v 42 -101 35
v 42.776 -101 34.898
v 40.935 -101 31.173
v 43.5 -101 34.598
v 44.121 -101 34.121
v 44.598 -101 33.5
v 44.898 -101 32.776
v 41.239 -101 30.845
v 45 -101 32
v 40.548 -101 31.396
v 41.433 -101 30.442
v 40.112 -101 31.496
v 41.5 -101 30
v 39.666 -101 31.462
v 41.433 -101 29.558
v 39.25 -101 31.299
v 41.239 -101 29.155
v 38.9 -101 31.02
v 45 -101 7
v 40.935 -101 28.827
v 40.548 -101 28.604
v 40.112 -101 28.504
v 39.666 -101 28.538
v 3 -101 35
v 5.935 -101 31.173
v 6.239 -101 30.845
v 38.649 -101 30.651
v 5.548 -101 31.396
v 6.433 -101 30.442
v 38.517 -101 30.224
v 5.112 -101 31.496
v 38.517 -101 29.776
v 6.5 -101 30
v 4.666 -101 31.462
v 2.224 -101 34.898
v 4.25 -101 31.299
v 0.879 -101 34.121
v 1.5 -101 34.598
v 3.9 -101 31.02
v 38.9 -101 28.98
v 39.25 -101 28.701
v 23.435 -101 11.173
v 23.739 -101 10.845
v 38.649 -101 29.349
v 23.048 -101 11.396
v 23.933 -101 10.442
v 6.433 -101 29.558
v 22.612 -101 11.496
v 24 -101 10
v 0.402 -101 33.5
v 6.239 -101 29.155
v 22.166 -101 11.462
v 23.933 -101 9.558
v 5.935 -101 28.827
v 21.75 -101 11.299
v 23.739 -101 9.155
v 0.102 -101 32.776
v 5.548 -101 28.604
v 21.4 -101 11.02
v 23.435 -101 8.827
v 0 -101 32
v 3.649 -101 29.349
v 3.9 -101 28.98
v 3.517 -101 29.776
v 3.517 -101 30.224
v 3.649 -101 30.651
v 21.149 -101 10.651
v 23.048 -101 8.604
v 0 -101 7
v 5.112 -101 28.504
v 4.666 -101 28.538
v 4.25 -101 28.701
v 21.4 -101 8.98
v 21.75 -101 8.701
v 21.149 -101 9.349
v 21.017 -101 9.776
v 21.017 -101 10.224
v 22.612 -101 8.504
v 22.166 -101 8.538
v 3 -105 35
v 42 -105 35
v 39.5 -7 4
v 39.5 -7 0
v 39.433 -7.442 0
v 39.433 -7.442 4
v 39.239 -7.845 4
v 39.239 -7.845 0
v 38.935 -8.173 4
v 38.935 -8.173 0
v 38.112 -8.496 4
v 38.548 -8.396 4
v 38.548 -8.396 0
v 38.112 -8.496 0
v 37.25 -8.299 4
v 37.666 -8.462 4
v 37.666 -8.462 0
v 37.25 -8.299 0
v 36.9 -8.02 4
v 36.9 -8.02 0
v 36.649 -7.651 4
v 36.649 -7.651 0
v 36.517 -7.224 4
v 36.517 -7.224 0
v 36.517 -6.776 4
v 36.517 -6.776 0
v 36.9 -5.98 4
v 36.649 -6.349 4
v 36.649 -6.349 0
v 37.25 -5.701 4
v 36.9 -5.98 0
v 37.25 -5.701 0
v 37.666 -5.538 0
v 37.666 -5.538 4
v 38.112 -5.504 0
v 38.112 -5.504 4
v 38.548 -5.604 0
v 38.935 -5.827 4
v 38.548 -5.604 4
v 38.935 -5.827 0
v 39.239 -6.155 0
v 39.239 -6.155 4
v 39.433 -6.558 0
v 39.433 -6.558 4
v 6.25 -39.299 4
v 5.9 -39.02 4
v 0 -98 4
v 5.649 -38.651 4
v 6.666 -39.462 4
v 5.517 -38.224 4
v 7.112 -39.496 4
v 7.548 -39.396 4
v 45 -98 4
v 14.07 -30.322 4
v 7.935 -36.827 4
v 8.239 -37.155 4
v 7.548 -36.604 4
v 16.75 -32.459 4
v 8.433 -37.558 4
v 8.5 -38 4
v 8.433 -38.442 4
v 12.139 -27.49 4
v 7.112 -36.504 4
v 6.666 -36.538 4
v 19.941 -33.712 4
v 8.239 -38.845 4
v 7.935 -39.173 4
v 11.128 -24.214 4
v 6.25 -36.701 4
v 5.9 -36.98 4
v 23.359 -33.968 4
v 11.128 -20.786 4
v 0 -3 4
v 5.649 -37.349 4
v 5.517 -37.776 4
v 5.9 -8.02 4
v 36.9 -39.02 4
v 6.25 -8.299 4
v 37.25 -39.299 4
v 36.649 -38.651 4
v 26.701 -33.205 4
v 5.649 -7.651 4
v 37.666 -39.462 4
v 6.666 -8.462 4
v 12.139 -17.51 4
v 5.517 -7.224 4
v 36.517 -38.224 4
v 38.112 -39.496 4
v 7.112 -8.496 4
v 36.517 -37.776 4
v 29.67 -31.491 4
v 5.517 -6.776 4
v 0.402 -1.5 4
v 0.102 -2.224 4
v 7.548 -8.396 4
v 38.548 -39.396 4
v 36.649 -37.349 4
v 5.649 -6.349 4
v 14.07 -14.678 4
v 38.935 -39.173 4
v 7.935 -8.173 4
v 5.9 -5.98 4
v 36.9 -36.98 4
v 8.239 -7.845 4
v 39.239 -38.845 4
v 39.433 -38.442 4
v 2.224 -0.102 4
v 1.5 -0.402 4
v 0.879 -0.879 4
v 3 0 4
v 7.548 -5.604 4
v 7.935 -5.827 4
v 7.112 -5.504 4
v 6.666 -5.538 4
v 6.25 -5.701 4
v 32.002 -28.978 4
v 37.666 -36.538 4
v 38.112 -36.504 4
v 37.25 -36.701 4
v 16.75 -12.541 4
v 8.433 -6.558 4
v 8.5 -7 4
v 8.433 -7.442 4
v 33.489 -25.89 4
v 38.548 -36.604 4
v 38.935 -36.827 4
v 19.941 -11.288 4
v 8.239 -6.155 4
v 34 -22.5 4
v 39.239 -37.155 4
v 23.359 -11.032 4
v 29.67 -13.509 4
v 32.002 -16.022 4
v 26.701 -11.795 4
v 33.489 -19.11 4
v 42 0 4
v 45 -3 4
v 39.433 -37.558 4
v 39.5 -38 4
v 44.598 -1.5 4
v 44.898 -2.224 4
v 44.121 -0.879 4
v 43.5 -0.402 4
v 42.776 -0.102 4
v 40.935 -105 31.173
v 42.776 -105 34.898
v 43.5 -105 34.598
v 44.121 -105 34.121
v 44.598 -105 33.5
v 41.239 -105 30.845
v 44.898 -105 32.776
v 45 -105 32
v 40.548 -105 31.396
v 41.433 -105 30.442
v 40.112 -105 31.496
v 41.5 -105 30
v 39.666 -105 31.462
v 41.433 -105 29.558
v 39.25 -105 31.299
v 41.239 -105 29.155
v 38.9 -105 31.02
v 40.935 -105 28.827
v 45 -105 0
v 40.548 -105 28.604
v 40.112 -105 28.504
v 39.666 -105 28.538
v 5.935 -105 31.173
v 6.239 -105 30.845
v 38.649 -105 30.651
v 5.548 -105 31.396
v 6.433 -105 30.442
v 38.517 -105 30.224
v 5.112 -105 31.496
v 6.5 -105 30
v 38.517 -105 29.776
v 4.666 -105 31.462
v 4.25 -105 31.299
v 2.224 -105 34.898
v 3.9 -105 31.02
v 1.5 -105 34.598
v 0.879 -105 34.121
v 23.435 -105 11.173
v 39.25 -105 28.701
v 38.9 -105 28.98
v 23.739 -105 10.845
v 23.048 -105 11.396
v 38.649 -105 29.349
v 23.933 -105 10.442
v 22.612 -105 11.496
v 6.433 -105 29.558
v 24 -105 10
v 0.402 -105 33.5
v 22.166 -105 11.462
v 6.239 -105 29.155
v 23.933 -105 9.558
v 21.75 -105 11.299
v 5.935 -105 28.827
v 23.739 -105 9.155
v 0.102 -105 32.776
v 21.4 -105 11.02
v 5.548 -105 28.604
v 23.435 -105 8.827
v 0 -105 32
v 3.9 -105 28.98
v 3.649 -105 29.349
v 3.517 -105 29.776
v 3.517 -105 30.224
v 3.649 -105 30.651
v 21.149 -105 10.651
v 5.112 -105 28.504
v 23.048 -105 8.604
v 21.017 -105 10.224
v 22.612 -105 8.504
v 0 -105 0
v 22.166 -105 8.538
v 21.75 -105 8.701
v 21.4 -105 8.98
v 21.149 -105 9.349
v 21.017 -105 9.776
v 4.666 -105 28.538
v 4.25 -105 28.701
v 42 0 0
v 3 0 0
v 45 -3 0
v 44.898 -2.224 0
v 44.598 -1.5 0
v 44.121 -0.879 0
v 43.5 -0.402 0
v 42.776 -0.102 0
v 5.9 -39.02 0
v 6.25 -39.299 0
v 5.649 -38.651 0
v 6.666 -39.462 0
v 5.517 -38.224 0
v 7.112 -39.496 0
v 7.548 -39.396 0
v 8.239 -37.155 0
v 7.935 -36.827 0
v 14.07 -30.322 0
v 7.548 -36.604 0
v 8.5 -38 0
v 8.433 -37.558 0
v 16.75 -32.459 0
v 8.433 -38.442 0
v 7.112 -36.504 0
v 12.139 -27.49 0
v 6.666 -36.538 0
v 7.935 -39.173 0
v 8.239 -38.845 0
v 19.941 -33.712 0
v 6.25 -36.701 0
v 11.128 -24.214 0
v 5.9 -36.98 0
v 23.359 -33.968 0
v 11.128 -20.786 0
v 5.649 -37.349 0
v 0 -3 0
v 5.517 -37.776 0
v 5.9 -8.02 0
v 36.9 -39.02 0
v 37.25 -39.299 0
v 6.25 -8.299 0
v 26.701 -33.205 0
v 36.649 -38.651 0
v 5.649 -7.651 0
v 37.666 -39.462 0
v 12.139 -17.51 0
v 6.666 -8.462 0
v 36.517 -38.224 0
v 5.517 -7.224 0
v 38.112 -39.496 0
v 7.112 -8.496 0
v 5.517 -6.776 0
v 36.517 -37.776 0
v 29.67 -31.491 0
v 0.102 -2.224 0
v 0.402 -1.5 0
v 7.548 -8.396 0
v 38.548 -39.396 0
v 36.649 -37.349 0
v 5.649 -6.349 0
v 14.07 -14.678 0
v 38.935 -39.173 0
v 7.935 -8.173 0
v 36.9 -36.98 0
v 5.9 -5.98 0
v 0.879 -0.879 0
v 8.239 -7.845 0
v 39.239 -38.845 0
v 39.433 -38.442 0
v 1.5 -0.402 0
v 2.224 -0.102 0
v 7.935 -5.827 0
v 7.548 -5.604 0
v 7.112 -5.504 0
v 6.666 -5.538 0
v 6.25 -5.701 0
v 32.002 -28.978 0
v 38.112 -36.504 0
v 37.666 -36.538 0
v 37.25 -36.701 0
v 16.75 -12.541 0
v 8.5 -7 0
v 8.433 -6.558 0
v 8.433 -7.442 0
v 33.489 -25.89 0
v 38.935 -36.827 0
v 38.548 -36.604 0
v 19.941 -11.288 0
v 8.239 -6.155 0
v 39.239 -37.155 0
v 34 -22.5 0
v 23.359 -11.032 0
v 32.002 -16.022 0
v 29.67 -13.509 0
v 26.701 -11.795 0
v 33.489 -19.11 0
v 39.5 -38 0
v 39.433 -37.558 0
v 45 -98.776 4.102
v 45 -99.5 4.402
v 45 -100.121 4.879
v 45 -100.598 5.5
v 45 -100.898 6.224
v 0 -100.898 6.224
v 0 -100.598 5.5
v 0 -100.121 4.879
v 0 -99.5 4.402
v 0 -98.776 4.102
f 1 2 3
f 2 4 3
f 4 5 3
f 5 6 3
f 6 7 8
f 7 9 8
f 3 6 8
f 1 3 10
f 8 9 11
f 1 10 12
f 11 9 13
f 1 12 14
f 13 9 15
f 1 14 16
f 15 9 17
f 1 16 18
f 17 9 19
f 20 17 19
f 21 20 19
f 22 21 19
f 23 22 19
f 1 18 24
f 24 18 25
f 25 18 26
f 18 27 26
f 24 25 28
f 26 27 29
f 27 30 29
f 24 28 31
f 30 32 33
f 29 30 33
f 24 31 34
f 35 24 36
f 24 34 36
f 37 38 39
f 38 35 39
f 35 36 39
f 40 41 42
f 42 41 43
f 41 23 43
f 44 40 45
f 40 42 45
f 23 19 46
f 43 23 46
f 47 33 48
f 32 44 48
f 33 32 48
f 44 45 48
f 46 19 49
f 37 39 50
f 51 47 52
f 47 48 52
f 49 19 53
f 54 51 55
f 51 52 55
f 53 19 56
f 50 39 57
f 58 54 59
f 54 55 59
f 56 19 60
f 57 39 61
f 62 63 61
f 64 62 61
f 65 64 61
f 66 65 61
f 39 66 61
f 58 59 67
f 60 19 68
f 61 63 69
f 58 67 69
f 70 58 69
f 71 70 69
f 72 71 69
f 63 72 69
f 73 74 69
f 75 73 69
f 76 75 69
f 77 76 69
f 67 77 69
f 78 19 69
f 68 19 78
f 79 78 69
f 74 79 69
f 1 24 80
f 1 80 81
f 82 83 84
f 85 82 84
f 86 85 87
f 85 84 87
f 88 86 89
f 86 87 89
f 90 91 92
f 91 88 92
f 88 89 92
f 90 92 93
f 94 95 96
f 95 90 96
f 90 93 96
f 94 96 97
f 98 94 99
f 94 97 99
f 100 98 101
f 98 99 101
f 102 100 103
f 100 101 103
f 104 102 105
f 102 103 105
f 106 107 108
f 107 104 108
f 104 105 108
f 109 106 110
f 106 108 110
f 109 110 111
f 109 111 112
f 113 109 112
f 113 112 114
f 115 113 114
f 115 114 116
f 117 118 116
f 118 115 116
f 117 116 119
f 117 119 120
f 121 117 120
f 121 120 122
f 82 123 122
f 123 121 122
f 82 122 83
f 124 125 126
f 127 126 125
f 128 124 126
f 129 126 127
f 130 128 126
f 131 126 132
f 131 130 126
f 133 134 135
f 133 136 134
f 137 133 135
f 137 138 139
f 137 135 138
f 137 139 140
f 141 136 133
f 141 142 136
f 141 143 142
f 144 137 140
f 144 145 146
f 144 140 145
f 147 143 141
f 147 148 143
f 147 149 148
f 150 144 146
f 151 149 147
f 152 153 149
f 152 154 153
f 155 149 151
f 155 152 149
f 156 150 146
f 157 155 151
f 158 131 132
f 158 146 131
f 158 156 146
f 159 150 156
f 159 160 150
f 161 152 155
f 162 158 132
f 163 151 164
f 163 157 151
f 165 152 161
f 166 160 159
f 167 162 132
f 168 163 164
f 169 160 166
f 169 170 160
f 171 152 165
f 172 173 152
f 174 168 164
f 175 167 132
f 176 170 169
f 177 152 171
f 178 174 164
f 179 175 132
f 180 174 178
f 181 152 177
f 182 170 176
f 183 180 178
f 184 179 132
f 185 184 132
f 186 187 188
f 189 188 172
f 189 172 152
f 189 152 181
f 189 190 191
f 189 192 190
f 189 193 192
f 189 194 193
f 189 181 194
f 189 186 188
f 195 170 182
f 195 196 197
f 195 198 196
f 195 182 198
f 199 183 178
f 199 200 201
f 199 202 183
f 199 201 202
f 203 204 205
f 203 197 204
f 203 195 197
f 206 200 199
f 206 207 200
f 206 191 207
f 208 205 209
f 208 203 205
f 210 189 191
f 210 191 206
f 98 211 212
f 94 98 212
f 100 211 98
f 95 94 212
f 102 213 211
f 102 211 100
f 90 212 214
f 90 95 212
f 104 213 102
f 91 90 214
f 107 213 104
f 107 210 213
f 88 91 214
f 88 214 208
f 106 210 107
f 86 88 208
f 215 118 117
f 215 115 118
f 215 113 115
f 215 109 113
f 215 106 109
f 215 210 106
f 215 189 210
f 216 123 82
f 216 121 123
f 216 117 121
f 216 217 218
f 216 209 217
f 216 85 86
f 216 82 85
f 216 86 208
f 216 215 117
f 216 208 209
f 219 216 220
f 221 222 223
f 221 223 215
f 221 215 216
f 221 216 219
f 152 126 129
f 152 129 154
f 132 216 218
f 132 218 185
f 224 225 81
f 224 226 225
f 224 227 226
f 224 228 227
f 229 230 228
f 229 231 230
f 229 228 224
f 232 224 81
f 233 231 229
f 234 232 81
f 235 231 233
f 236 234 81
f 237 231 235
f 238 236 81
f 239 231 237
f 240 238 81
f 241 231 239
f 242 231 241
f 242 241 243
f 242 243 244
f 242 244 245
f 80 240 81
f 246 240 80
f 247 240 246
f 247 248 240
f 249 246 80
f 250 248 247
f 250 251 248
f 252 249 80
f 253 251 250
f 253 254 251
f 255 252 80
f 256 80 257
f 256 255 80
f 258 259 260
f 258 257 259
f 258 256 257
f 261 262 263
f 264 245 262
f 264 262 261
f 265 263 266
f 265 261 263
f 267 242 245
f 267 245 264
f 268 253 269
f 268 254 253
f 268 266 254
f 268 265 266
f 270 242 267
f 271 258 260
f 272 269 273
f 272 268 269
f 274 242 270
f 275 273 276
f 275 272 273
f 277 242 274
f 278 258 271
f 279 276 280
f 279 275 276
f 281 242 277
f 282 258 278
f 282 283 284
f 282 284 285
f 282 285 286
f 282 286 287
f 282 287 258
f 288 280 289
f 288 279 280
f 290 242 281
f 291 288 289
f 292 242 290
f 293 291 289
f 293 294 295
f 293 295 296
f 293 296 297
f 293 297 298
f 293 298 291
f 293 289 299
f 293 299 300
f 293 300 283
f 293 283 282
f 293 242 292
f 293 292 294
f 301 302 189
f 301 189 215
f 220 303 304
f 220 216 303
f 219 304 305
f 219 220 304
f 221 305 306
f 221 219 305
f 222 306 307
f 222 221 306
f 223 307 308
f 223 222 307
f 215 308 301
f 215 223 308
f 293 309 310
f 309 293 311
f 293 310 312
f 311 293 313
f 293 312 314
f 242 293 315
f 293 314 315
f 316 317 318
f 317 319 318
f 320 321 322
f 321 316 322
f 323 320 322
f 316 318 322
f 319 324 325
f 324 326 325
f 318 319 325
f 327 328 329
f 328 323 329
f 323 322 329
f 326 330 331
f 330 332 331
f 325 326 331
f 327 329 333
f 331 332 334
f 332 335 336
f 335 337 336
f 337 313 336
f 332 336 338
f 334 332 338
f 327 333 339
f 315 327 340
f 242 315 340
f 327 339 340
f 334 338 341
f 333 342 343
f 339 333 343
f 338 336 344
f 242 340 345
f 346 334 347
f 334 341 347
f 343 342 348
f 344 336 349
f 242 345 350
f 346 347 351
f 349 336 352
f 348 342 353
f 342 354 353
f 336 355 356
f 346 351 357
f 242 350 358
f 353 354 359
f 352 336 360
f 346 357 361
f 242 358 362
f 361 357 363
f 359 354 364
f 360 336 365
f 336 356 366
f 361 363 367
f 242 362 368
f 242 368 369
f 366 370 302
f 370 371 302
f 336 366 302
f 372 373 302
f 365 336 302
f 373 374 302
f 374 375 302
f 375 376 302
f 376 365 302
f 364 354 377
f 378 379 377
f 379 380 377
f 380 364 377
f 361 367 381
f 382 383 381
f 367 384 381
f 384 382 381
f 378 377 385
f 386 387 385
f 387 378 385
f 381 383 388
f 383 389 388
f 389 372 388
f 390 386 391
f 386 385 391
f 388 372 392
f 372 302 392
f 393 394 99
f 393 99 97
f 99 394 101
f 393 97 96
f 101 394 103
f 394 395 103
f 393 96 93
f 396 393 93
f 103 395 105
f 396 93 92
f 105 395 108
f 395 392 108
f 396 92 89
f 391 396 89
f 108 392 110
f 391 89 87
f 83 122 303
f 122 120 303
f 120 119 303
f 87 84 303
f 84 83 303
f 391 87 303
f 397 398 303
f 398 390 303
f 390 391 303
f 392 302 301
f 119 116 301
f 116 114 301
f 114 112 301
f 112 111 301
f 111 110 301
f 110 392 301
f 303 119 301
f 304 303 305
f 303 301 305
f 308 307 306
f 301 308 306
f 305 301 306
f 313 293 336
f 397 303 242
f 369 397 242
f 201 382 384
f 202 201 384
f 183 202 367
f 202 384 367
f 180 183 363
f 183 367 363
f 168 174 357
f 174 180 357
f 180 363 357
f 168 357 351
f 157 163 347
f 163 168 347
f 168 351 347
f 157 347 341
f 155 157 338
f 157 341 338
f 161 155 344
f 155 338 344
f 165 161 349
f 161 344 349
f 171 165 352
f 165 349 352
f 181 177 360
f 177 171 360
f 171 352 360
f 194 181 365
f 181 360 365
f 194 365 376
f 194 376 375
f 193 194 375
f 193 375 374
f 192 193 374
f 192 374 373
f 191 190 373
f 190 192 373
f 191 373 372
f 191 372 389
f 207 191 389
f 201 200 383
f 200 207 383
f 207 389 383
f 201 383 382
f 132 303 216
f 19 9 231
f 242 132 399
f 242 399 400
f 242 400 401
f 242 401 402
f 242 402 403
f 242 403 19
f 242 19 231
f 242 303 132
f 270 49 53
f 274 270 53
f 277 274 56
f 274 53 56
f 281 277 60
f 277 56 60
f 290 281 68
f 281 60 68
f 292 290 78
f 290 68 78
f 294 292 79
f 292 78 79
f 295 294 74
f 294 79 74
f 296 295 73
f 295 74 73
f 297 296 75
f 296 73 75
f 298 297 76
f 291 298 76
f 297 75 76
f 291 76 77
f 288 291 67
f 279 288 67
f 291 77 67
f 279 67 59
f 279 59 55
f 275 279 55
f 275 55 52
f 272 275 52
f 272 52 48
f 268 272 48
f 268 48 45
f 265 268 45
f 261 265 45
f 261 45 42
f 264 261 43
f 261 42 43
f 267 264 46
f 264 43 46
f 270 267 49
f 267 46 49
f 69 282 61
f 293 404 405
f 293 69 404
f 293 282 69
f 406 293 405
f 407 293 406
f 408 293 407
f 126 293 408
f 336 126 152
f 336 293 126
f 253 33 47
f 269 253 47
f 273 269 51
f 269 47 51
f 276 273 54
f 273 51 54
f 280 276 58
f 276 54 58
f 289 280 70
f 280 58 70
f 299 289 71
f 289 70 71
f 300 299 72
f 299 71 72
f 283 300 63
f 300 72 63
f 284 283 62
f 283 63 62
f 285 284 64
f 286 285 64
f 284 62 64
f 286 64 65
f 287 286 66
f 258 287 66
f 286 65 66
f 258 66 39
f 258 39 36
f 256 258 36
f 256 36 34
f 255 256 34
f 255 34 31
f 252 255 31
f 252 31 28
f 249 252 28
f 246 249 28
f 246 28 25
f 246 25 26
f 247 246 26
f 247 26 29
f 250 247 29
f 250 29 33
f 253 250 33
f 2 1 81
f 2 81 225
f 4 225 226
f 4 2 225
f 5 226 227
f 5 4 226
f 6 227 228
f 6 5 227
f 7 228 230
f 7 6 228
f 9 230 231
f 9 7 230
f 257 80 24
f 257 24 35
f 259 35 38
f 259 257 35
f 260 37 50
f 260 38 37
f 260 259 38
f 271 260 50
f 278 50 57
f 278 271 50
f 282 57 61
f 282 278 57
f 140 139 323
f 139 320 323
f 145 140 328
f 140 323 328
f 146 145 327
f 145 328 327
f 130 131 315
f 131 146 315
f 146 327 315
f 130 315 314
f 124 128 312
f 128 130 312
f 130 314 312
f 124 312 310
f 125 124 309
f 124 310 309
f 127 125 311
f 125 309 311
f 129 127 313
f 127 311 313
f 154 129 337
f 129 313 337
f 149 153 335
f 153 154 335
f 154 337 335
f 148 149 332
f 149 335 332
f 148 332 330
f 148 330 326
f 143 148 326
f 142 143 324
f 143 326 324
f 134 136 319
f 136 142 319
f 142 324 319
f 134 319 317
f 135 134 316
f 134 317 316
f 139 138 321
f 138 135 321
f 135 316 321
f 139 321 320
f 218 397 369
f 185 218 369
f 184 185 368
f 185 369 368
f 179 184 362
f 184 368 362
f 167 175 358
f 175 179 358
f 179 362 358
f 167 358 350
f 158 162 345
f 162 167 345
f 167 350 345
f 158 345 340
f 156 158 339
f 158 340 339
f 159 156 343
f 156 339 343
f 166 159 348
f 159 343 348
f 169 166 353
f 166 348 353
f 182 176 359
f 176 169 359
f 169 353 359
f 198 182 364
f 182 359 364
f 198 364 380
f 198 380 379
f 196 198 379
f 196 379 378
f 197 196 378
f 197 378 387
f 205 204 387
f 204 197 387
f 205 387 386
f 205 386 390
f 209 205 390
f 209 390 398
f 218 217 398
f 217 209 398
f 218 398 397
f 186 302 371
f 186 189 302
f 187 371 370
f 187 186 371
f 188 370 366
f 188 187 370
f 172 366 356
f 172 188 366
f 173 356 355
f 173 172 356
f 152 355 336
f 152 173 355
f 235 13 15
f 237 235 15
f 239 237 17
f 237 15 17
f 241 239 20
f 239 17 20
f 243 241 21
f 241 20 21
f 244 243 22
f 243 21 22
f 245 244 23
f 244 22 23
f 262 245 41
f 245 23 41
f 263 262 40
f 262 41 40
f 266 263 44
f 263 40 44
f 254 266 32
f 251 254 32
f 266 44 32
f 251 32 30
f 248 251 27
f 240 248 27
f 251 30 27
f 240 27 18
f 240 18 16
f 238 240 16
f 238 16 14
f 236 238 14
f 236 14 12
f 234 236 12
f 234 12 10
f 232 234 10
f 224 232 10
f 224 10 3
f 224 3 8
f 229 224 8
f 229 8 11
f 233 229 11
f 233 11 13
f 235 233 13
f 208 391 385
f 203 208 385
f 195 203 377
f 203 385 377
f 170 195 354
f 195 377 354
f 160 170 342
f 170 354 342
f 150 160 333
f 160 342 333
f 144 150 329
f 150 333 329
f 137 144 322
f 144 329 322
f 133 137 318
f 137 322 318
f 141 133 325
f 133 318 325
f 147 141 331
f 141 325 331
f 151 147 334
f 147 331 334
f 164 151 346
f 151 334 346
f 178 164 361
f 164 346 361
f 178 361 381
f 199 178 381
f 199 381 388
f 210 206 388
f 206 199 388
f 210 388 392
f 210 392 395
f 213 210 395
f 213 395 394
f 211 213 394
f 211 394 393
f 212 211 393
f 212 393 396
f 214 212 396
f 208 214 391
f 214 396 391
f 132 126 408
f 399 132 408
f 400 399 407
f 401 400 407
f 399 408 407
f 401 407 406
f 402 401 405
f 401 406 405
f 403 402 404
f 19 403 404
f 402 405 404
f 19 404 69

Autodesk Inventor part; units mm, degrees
ref_plane "YZ Plane" through (0, 0, 0) normal (1, 0, 0) x (0, 1, 0)
ref_plane "XZ Plane" through (0, 0, 0) normal (0, 1, 0) x (-1, 0, 0)
ref_plane "XY Plane" through (0, 0, 0) normal (0, 0, 1) x (1, 0, 0)
sketch "Sketch1" plane through (0, 0, 0) normal (0, 0, 1) x (1, 0, 0)
  point P0 (0, 0)
sketch "Sketch2" plane through (0, 0, 0) normal (0, 0, 1) x (1, 0, 0)
  line L0 (0, 0) -> (45, 0)
  line L1 (45, 0) -> (45, -105)
  line L2 (45, -105) -> (0, -105)
  line L3 (0, -105) -> (0, 0)
  circle A0 centre (7, -7) radius 1.5
  circle A1 centre (7, -38) radius 1.5
  circle A2 centre (38, -7) radius 1.5
  circle A3 centre (38, -38) radius 1.5
  circle A4 centre (22.5, -22.5) radius 11.5
  dimension "d0" = 45
  dimension "d1" = 105
  dimension "d2" = 3
  dimension "d3" = 3
  dimension "d4" = 3
  dimension "d5" = 3
  dimension "d6" = 31
  dimension "d10" = 7
  dimension "d11" = 7
  dimension "d12" = 31
  dimension "d13" = 7
  dimension "d14" = 7
  dimension "d15" = 31
  dimension "d16" = 31
  dimension "d17" = 23
  dimension "d18" = 22.5
  dimension "d19" = 22.5
extrude "Extrusion1" add sketch "Sketch2" along normal blind 4
sketch "Sketch3" plane through (0, 0, 4) normal (0, 0, 1) x (1, 0, 0)
  point P0 (0, 0)
sketch "Sketch4" plane through (0, 0, 4) normal (0, 0, 1) x (1, 0, 0)
  line L0 (0, 0) -> (0, -105) projected
  line L1 (45, -105) -> (45, 0) projected
  line L2 (0, 0) -> (45, 0)
  line L3 (45, 0) -> (45, -105)
  line L4 (45, -105) -> (0, -105)
  line L5 (0, -105) -> (0, 0)
  line L6 (0, -105) -> (45, -105)
  line L7 (45, -105) -> (45, -101)
  line L8 (45, -101) -> (0, -101)
  line L9 (0, -101) -> (0, -105)
  dimension "d22" = 4
extrude "Extrusion2" add sketch "Sketch4" along normal blind 31 contours L8 L1 L4 L0
sketch "Sketch5" plane through (0, -101, 4) normal (0, 1, 0) x (1, 0, 0)
  line L0 (45, 4) -> (0, 4) projected
  line L1 (45, 4) -> (45, -31) projected
  line L2 (0, 4) -> (45, 4)
  line L3 (45, 4) -> (45, -31)
  line L4 (45, -31) -> (0, -31)
  line L5 (0, -31) -> (0, 4)
  circle A0 centre (5, -26) radius 1.5
  circle A1 centre (40, -26) radius 1.5
  circle A2 centre (22.5, -6) radius 1.5
  dimension "d25" = 3
  dimension "d26" = 3
  dimension "d27" = 3
  dimension "d28" = 5
  dimension "d29" = 5
  dimension "d30" = 5
  dimension "d31" = 5
  dimension "d32" = 22.5
  dimension "d33" = 25
extrude "Extrusion3" cut sketch "Sketch5" against normal blind 4 contours A0 | A1 | A2
fillet "Fillet1" radius 3 1 edges at (22.5, -101, 4)
fillet "Fillet2" radius 3 1 edges at (0, 0, 2)
fillet "Fillet3" radius 3 1 edges at (0, -103, 35)
fillet "Fillet4" radius 3 1 edges at (45, -103, 35)
fillet "Fillet5" radius 3 1 edges at (45, 0, 2)
properties part number "Suporte Esquerdo 2"
